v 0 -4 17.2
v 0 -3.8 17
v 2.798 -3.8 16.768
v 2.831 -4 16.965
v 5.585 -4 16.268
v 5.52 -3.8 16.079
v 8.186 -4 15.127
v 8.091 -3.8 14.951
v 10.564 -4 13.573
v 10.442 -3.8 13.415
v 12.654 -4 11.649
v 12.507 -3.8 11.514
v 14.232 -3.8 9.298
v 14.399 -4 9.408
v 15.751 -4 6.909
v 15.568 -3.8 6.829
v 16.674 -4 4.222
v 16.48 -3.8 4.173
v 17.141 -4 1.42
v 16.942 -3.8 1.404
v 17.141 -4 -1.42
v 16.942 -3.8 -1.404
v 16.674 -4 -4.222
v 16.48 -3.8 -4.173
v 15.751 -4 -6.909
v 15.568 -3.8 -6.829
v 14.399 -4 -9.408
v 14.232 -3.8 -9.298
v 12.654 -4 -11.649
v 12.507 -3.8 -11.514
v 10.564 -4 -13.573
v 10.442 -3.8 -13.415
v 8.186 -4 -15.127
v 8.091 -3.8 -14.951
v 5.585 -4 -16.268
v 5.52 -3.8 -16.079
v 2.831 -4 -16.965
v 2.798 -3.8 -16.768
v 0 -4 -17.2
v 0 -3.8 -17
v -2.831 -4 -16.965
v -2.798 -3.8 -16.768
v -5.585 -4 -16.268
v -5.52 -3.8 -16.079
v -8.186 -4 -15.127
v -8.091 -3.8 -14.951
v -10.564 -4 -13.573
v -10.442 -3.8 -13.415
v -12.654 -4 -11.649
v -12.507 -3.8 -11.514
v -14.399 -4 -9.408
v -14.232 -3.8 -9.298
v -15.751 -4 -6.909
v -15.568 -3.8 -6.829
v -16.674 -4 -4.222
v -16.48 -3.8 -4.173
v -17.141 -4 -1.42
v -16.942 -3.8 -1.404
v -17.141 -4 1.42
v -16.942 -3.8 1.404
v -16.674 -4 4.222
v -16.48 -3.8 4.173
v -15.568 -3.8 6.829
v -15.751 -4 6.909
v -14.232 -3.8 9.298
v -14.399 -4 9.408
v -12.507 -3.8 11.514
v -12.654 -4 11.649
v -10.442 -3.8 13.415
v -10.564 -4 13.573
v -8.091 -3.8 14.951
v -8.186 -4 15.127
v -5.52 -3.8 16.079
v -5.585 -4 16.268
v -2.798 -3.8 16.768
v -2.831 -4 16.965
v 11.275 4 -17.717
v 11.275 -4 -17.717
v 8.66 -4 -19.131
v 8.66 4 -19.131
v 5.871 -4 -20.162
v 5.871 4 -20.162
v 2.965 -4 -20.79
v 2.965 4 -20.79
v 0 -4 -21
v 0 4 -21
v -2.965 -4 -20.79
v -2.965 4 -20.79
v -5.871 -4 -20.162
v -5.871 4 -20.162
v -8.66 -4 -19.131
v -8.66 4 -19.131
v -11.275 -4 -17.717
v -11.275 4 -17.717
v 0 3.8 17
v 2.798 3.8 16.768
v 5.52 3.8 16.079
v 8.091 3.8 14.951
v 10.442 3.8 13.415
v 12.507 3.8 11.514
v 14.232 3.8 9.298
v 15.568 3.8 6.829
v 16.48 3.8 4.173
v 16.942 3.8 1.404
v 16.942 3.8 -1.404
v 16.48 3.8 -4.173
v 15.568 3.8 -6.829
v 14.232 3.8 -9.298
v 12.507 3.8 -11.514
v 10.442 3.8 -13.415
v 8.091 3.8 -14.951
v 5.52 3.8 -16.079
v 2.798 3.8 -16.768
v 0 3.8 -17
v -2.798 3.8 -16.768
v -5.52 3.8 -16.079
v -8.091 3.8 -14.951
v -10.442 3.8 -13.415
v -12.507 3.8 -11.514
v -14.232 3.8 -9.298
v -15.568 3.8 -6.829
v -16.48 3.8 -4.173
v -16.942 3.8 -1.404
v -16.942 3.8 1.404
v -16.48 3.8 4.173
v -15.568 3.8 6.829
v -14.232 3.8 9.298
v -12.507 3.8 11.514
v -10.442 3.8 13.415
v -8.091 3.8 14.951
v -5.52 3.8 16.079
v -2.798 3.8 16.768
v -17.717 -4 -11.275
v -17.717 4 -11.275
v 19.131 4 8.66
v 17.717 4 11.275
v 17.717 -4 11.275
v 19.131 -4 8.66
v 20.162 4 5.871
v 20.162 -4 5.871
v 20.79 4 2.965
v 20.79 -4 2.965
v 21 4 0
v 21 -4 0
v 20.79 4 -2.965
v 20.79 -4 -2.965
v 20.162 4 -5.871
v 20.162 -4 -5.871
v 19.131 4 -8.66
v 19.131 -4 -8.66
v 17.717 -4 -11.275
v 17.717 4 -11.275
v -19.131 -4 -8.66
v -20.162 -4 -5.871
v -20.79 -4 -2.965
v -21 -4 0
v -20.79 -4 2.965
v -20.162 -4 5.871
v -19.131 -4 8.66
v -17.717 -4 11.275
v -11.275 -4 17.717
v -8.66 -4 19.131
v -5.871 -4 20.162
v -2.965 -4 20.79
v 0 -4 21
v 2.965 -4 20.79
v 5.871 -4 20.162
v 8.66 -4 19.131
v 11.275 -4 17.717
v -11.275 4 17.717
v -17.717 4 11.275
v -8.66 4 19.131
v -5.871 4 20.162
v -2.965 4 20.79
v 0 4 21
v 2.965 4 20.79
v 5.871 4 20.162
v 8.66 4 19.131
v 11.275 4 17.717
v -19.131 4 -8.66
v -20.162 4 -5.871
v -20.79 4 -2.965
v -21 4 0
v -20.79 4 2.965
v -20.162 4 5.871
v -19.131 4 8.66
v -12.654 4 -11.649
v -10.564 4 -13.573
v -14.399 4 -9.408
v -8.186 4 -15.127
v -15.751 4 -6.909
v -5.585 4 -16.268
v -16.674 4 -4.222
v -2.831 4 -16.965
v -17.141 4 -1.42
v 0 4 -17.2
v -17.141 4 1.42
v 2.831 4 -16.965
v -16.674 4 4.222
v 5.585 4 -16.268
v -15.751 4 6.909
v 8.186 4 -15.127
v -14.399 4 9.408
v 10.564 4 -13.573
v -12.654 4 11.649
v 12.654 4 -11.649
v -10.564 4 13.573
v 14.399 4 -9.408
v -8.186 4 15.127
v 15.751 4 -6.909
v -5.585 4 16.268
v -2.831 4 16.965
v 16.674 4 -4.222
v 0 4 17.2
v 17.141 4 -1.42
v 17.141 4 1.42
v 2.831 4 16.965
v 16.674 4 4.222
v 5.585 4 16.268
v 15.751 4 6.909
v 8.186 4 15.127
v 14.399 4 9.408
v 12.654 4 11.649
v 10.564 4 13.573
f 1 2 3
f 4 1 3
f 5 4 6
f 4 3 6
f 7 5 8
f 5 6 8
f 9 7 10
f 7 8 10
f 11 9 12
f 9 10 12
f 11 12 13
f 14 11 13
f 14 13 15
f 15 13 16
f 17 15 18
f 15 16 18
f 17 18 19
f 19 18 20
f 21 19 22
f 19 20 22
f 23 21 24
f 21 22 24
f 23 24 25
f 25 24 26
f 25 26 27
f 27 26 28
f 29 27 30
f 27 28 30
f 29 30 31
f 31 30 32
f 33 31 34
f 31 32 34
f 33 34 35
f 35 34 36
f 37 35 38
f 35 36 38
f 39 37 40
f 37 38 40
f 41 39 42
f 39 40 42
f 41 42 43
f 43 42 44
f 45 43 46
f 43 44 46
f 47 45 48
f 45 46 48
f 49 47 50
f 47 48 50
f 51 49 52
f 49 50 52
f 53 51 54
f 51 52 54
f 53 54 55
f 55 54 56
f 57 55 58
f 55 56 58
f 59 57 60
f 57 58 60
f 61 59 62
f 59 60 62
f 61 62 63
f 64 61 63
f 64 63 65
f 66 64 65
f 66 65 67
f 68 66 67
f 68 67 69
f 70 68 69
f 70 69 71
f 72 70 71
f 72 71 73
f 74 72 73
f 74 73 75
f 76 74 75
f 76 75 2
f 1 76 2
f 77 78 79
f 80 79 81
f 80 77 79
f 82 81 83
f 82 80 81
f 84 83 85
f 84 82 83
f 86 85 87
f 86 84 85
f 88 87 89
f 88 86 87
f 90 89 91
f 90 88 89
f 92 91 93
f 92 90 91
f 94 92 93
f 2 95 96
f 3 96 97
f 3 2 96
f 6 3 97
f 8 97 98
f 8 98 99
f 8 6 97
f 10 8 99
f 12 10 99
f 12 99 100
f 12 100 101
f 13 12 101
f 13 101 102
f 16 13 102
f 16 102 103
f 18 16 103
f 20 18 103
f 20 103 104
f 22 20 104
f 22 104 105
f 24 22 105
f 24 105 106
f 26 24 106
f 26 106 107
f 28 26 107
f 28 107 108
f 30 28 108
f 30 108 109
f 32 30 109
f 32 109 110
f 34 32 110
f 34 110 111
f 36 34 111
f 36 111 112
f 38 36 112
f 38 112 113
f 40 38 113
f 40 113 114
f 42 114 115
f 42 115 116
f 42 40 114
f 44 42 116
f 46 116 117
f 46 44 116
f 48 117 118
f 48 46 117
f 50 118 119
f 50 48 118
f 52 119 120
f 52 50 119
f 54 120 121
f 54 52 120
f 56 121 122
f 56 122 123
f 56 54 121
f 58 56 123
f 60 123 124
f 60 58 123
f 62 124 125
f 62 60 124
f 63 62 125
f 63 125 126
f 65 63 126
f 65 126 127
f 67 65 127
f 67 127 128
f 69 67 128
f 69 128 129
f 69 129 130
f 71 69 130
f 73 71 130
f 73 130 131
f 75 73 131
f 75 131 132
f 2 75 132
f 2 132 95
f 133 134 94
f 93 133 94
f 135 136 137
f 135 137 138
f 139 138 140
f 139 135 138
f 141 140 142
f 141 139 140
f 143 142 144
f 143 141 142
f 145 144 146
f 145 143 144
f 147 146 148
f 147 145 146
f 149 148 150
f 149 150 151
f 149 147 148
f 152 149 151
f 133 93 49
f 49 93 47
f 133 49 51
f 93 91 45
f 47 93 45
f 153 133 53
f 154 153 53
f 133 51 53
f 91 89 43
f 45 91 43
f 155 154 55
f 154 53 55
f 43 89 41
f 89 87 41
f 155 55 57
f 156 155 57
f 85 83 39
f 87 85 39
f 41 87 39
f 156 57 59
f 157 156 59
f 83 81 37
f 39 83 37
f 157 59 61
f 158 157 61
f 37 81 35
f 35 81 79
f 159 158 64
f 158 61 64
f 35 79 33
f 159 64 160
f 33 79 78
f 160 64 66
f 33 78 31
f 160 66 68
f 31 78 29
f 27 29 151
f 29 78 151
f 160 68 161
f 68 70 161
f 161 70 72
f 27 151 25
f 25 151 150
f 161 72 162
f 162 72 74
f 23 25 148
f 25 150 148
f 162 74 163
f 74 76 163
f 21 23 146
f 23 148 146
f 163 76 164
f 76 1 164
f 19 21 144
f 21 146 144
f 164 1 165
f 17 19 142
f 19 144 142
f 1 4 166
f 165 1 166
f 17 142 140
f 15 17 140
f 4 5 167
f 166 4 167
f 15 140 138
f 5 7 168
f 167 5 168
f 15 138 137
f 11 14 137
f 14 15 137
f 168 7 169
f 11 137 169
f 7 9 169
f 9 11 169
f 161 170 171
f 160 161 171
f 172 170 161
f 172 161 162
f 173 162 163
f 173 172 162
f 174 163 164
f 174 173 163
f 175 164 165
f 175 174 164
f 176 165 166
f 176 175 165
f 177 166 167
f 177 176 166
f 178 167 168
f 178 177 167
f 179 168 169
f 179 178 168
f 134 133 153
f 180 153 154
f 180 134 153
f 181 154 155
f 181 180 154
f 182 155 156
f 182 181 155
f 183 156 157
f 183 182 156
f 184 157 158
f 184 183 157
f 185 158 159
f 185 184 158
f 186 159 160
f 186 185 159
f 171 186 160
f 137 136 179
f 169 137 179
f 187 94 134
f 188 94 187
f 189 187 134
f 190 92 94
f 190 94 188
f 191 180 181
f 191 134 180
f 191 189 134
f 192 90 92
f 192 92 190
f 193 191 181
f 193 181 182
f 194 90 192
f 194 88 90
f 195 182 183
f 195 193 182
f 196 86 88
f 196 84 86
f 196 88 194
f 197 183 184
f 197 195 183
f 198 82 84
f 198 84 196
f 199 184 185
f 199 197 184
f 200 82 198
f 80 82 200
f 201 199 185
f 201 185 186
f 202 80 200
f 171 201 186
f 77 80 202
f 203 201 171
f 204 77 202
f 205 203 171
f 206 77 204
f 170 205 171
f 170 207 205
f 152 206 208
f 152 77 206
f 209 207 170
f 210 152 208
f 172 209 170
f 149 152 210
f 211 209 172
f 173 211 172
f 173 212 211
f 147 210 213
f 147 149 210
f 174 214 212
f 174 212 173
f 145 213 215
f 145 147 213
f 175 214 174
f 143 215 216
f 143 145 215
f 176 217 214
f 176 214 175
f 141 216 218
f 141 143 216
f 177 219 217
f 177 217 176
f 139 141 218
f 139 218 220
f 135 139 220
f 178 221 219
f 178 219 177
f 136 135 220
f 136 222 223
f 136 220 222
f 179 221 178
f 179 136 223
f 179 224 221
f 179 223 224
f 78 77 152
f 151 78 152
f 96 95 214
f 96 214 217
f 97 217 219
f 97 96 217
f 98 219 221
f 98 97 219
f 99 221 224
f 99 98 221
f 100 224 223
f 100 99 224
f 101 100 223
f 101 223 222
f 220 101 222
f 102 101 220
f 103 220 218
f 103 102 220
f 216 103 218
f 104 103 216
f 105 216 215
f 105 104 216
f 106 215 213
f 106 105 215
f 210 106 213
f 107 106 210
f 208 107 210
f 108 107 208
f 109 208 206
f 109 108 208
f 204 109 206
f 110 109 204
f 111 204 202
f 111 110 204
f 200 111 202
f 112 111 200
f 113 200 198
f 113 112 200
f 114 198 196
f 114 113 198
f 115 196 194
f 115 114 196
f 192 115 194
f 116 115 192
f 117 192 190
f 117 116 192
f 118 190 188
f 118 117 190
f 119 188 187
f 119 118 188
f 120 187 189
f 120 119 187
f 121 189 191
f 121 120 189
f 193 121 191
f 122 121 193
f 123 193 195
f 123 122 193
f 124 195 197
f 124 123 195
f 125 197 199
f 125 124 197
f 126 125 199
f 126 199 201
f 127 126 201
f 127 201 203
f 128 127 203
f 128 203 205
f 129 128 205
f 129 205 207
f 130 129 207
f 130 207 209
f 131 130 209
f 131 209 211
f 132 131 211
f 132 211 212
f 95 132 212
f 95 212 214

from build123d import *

# Parameters (mm, degrees)
BASES_R            = 21
BASES_R_2          = 17
BASE_DEPTH         = 4
FLATCUT_DEPTH      = 30.966648128
FCCIRPATTERN_COUNT = 4
BASECHAMFER_SIZE   = 0.2


with BuildPart() as part:
    # BaseS → Base (new, symmetric)
    with BuildSketch(Plane(origin=(0, 0, 0), x_dir=(1, 0, 0), z_dir=(0, 1, 0))):
        Circle(BASES_R)
        Circle(BASES_R_2, mode=Mode.SUBTRACT)
    extrude(amount=BASE_DEPTH, both=True)

    # FlatCutS → FlatCut (cut, symmetric)
    with BuildSketch(Plane(origin=(0, 0, 0), x_dir=(1, 0, 0), z_dir=(0, 1, 0))):
        with BuildLine():
            Line((11.274664333, 17.716713696), (17.716713696, 11.274664333))
            ThreePointArc((17.716713696, 11.274664333), (14.849242405, 14.849242405), (11.274664333, 17.716713696))
        make_face()
    flatcut = extrude(amount=FLATCUT_DEPTH, both=True, mode=Mode.SUBTRACT)

    # FCCirPattern: FlatCut ×4 about axis
    fccirpattern_axis = Axis((0, 1.1, 0), (0, -1, 0))
    for i in range(1, FCCIRPATTERN_COUNT):
        add(flatcut.rotate(fccirpattern_axis, i * 360 / FCCIRPATTERN_COUNT), mode=Mode.SUBTRACT)

    # BaseChamfer
    basechamfer_edges = [part.edges().sort_by_distance(p)[0] for p in [
        (-17, 4, 0),
        (-17, -4, 0),
    ]]
    chamfer(basechamfer_edges, length=BASECHAMFER_SIZE)


solid = part.part
